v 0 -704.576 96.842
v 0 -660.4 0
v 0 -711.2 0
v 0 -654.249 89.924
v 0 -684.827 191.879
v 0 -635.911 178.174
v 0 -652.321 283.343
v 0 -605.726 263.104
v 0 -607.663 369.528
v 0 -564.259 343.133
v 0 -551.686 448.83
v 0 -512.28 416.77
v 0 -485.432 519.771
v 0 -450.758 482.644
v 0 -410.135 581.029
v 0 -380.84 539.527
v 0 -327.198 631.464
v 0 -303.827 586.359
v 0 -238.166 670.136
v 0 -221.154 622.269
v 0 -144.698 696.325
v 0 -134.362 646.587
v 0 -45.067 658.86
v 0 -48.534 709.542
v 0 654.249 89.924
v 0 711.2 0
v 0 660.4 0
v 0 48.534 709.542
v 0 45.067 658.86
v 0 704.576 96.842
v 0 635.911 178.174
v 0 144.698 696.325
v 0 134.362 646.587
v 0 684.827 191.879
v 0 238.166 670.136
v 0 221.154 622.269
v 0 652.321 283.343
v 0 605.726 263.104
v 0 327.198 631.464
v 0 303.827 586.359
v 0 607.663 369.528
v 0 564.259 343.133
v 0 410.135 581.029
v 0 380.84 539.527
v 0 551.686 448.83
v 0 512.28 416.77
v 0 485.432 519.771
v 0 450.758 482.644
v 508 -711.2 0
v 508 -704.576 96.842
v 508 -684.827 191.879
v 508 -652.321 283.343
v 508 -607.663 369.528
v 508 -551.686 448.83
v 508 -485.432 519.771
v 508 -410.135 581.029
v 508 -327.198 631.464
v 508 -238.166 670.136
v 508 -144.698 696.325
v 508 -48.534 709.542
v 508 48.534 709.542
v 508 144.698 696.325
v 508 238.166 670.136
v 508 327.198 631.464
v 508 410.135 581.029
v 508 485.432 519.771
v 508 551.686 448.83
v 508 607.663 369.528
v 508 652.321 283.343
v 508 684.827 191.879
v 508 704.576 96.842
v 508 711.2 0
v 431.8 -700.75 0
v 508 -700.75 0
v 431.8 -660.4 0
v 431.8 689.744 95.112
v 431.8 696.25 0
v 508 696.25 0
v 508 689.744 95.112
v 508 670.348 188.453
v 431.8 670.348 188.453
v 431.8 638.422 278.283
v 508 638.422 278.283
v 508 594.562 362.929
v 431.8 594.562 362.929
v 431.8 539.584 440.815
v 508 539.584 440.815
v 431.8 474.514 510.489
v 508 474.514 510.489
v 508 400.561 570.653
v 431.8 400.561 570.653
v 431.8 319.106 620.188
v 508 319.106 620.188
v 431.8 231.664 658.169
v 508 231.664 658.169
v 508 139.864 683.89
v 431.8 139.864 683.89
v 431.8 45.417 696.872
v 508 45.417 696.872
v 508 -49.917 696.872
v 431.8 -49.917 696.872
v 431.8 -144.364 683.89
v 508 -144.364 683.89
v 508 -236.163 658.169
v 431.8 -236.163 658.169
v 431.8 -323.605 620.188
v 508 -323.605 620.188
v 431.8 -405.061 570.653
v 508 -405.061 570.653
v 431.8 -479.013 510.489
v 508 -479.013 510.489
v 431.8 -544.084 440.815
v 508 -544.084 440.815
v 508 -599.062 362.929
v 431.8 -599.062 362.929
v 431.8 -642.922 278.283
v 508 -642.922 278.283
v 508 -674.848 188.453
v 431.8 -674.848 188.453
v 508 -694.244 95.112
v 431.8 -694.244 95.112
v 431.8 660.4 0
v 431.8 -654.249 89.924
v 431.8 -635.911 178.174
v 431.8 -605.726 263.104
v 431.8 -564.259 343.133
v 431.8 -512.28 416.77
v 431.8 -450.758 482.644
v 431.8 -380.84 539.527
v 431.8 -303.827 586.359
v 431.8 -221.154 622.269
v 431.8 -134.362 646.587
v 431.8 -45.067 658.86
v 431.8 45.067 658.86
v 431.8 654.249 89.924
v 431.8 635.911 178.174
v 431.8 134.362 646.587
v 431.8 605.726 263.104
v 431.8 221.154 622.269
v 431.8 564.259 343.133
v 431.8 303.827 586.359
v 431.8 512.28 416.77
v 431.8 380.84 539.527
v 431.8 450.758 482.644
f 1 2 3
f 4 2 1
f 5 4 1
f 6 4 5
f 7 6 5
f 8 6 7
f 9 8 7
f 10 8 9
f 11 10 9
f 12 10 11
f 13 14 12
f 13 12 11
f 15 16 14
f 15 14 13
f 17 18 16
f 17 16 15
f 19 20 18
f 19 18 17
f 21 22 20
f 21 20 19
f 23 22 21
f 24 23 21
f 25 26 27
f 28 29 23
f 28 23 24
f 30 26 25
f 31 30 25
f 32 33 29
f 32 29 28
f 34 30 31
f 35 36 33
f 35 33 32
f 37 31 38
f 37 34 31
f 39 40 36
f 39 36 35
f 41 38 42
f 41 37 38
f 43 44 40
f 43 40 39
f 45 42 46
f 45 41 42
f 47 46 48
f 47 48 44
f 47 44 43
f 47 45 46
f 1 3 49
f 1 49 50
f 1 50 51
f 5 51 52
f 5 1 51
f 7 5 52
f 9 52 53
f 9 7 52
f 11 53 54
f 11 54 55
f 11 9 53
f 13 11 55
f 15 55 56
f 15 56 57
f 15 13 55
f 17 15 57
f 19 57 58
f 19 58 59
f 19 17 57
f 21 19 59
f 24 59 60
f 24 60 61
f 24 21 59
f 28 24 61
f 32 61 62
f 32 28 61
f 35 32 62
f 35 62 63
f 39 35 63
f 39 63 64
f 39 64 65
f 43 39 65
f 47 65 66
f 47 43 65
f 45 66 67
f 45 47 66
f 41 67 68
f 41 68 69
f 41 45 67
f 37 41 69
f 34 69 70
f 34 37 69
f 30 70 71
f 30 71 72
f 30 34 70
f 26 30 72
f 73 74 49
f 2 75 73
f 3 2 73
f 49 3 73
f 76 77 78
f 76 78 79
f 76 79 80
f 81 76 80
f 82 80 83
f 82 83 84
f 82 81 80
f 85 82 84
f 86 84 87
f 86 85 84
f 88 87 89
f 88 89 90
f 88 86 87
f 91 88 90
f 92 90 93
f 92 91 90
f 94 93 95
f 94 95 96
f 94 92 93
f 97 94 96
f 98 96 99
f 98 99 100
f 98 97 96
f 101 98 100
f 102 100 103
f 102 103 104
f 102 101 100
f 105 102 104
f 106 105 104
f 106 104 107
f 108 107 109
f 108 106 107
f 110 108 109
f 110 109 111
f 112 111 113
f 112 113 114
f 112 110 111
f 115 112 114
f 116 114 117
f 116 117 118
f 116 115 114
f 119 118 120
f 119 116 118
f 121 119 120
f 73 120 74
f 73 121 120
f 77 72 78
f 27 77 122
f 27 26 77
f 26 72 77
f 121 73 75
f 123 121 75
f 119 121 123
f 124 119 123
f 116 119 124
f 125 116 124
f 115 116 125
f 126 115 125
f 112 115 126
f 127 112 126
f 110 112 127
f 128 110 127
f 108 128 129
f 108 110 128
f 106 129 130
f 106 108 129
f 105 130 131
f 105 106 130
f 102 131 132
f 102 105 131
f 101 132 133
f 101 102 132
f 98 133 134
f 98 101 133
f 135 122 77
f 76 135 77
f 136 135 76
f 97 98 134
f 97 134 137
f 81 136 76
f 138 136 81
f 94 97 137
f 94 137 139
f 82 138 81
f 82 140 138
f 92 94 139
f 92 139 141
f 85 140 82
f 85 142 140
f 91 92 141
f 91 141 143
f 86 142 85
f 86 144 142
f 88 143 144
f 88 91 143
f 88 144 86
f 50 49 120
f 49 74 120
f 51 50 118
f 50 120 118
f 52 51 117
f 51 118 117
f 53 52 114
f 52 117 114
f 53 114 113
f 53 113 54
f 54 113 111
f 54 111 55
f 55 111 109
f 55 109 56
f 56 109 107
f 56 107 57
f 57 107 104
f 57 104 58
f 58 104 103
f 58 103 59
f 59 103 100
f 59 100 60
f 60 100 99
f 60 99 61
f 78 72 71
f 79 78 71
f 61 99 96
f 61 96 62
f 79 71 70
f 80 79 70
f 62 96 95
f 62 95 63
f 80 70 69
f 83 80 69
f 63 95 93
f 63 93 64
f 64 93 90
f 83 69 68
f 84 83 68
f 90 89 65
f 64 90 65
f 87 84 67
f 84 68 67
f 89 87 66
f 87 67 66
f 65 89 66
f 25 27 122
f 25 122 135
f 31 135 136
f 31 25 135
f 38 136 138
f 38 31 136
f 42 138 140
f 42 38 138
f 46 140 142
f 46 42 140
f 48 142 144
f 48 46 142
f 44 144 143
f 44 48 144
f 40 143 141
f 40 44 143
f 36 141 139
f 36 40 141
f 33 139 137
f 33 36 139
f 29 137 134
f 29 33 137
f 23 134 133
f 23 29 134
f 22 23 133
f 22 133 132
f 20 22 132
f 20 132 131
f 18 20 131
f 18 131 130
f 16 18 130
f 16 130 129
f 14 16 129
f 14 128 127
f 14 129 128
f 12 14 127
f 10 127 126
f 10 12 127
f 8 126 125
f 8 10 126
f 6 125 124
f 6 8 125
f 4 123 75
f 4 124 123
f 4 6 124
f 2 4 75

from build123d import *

# Parameters (mm, degrees)
BOSS_EXTRUDE1_DEPTH = 508
CAVITY1_START       = 431.8
CAVITY1_DEPTH       = 76.2


# Read off the part's stored shape, not the designer's step: Cavity1
with BuildPart() as part:
    # Sketch1 → Boss-Extrude1 (new body)
    with BuildSketch(Plane(origin=(0, 0, 0), x_dir=(0, 0, -1), z_dir=(1, 0, 0))):
        with BuildLine():
            Line((0, 711.2), (0, 660.4))
            ThreePointArc((0, 660.4), (-660.4, 0), (0, -660.4))
            Line((0, -660.4), (0, -711.2))
            ThreePointArc((0, -711.2), (-711.2, 0), (0, 711.2))
        make_face()
    extrude(amount=BOSS_EXTRUDE1_DEPTH)

    # Cavity1 outline → Cavity1 (cut)
    with BuildSketch(Plane.YZ.offset(CAVITY1_START)):
        with BuildLine():
            ThreePointArc((696.250142702, 0), (-2.249857298, 698.5), (-700.749857298, 0))
            Line((-700.749857298, 0), (-660.4, 0))
            ThreePointArc((-660.4, 0), (0, 660.4), (660.4, 0))
            Line((660.4, 0), (696.250142702, 0))
        make_face()
    extrude(amount=CAVITY1_DEPTH, mode=Mode.SUBTRACT)


solid = part.part
